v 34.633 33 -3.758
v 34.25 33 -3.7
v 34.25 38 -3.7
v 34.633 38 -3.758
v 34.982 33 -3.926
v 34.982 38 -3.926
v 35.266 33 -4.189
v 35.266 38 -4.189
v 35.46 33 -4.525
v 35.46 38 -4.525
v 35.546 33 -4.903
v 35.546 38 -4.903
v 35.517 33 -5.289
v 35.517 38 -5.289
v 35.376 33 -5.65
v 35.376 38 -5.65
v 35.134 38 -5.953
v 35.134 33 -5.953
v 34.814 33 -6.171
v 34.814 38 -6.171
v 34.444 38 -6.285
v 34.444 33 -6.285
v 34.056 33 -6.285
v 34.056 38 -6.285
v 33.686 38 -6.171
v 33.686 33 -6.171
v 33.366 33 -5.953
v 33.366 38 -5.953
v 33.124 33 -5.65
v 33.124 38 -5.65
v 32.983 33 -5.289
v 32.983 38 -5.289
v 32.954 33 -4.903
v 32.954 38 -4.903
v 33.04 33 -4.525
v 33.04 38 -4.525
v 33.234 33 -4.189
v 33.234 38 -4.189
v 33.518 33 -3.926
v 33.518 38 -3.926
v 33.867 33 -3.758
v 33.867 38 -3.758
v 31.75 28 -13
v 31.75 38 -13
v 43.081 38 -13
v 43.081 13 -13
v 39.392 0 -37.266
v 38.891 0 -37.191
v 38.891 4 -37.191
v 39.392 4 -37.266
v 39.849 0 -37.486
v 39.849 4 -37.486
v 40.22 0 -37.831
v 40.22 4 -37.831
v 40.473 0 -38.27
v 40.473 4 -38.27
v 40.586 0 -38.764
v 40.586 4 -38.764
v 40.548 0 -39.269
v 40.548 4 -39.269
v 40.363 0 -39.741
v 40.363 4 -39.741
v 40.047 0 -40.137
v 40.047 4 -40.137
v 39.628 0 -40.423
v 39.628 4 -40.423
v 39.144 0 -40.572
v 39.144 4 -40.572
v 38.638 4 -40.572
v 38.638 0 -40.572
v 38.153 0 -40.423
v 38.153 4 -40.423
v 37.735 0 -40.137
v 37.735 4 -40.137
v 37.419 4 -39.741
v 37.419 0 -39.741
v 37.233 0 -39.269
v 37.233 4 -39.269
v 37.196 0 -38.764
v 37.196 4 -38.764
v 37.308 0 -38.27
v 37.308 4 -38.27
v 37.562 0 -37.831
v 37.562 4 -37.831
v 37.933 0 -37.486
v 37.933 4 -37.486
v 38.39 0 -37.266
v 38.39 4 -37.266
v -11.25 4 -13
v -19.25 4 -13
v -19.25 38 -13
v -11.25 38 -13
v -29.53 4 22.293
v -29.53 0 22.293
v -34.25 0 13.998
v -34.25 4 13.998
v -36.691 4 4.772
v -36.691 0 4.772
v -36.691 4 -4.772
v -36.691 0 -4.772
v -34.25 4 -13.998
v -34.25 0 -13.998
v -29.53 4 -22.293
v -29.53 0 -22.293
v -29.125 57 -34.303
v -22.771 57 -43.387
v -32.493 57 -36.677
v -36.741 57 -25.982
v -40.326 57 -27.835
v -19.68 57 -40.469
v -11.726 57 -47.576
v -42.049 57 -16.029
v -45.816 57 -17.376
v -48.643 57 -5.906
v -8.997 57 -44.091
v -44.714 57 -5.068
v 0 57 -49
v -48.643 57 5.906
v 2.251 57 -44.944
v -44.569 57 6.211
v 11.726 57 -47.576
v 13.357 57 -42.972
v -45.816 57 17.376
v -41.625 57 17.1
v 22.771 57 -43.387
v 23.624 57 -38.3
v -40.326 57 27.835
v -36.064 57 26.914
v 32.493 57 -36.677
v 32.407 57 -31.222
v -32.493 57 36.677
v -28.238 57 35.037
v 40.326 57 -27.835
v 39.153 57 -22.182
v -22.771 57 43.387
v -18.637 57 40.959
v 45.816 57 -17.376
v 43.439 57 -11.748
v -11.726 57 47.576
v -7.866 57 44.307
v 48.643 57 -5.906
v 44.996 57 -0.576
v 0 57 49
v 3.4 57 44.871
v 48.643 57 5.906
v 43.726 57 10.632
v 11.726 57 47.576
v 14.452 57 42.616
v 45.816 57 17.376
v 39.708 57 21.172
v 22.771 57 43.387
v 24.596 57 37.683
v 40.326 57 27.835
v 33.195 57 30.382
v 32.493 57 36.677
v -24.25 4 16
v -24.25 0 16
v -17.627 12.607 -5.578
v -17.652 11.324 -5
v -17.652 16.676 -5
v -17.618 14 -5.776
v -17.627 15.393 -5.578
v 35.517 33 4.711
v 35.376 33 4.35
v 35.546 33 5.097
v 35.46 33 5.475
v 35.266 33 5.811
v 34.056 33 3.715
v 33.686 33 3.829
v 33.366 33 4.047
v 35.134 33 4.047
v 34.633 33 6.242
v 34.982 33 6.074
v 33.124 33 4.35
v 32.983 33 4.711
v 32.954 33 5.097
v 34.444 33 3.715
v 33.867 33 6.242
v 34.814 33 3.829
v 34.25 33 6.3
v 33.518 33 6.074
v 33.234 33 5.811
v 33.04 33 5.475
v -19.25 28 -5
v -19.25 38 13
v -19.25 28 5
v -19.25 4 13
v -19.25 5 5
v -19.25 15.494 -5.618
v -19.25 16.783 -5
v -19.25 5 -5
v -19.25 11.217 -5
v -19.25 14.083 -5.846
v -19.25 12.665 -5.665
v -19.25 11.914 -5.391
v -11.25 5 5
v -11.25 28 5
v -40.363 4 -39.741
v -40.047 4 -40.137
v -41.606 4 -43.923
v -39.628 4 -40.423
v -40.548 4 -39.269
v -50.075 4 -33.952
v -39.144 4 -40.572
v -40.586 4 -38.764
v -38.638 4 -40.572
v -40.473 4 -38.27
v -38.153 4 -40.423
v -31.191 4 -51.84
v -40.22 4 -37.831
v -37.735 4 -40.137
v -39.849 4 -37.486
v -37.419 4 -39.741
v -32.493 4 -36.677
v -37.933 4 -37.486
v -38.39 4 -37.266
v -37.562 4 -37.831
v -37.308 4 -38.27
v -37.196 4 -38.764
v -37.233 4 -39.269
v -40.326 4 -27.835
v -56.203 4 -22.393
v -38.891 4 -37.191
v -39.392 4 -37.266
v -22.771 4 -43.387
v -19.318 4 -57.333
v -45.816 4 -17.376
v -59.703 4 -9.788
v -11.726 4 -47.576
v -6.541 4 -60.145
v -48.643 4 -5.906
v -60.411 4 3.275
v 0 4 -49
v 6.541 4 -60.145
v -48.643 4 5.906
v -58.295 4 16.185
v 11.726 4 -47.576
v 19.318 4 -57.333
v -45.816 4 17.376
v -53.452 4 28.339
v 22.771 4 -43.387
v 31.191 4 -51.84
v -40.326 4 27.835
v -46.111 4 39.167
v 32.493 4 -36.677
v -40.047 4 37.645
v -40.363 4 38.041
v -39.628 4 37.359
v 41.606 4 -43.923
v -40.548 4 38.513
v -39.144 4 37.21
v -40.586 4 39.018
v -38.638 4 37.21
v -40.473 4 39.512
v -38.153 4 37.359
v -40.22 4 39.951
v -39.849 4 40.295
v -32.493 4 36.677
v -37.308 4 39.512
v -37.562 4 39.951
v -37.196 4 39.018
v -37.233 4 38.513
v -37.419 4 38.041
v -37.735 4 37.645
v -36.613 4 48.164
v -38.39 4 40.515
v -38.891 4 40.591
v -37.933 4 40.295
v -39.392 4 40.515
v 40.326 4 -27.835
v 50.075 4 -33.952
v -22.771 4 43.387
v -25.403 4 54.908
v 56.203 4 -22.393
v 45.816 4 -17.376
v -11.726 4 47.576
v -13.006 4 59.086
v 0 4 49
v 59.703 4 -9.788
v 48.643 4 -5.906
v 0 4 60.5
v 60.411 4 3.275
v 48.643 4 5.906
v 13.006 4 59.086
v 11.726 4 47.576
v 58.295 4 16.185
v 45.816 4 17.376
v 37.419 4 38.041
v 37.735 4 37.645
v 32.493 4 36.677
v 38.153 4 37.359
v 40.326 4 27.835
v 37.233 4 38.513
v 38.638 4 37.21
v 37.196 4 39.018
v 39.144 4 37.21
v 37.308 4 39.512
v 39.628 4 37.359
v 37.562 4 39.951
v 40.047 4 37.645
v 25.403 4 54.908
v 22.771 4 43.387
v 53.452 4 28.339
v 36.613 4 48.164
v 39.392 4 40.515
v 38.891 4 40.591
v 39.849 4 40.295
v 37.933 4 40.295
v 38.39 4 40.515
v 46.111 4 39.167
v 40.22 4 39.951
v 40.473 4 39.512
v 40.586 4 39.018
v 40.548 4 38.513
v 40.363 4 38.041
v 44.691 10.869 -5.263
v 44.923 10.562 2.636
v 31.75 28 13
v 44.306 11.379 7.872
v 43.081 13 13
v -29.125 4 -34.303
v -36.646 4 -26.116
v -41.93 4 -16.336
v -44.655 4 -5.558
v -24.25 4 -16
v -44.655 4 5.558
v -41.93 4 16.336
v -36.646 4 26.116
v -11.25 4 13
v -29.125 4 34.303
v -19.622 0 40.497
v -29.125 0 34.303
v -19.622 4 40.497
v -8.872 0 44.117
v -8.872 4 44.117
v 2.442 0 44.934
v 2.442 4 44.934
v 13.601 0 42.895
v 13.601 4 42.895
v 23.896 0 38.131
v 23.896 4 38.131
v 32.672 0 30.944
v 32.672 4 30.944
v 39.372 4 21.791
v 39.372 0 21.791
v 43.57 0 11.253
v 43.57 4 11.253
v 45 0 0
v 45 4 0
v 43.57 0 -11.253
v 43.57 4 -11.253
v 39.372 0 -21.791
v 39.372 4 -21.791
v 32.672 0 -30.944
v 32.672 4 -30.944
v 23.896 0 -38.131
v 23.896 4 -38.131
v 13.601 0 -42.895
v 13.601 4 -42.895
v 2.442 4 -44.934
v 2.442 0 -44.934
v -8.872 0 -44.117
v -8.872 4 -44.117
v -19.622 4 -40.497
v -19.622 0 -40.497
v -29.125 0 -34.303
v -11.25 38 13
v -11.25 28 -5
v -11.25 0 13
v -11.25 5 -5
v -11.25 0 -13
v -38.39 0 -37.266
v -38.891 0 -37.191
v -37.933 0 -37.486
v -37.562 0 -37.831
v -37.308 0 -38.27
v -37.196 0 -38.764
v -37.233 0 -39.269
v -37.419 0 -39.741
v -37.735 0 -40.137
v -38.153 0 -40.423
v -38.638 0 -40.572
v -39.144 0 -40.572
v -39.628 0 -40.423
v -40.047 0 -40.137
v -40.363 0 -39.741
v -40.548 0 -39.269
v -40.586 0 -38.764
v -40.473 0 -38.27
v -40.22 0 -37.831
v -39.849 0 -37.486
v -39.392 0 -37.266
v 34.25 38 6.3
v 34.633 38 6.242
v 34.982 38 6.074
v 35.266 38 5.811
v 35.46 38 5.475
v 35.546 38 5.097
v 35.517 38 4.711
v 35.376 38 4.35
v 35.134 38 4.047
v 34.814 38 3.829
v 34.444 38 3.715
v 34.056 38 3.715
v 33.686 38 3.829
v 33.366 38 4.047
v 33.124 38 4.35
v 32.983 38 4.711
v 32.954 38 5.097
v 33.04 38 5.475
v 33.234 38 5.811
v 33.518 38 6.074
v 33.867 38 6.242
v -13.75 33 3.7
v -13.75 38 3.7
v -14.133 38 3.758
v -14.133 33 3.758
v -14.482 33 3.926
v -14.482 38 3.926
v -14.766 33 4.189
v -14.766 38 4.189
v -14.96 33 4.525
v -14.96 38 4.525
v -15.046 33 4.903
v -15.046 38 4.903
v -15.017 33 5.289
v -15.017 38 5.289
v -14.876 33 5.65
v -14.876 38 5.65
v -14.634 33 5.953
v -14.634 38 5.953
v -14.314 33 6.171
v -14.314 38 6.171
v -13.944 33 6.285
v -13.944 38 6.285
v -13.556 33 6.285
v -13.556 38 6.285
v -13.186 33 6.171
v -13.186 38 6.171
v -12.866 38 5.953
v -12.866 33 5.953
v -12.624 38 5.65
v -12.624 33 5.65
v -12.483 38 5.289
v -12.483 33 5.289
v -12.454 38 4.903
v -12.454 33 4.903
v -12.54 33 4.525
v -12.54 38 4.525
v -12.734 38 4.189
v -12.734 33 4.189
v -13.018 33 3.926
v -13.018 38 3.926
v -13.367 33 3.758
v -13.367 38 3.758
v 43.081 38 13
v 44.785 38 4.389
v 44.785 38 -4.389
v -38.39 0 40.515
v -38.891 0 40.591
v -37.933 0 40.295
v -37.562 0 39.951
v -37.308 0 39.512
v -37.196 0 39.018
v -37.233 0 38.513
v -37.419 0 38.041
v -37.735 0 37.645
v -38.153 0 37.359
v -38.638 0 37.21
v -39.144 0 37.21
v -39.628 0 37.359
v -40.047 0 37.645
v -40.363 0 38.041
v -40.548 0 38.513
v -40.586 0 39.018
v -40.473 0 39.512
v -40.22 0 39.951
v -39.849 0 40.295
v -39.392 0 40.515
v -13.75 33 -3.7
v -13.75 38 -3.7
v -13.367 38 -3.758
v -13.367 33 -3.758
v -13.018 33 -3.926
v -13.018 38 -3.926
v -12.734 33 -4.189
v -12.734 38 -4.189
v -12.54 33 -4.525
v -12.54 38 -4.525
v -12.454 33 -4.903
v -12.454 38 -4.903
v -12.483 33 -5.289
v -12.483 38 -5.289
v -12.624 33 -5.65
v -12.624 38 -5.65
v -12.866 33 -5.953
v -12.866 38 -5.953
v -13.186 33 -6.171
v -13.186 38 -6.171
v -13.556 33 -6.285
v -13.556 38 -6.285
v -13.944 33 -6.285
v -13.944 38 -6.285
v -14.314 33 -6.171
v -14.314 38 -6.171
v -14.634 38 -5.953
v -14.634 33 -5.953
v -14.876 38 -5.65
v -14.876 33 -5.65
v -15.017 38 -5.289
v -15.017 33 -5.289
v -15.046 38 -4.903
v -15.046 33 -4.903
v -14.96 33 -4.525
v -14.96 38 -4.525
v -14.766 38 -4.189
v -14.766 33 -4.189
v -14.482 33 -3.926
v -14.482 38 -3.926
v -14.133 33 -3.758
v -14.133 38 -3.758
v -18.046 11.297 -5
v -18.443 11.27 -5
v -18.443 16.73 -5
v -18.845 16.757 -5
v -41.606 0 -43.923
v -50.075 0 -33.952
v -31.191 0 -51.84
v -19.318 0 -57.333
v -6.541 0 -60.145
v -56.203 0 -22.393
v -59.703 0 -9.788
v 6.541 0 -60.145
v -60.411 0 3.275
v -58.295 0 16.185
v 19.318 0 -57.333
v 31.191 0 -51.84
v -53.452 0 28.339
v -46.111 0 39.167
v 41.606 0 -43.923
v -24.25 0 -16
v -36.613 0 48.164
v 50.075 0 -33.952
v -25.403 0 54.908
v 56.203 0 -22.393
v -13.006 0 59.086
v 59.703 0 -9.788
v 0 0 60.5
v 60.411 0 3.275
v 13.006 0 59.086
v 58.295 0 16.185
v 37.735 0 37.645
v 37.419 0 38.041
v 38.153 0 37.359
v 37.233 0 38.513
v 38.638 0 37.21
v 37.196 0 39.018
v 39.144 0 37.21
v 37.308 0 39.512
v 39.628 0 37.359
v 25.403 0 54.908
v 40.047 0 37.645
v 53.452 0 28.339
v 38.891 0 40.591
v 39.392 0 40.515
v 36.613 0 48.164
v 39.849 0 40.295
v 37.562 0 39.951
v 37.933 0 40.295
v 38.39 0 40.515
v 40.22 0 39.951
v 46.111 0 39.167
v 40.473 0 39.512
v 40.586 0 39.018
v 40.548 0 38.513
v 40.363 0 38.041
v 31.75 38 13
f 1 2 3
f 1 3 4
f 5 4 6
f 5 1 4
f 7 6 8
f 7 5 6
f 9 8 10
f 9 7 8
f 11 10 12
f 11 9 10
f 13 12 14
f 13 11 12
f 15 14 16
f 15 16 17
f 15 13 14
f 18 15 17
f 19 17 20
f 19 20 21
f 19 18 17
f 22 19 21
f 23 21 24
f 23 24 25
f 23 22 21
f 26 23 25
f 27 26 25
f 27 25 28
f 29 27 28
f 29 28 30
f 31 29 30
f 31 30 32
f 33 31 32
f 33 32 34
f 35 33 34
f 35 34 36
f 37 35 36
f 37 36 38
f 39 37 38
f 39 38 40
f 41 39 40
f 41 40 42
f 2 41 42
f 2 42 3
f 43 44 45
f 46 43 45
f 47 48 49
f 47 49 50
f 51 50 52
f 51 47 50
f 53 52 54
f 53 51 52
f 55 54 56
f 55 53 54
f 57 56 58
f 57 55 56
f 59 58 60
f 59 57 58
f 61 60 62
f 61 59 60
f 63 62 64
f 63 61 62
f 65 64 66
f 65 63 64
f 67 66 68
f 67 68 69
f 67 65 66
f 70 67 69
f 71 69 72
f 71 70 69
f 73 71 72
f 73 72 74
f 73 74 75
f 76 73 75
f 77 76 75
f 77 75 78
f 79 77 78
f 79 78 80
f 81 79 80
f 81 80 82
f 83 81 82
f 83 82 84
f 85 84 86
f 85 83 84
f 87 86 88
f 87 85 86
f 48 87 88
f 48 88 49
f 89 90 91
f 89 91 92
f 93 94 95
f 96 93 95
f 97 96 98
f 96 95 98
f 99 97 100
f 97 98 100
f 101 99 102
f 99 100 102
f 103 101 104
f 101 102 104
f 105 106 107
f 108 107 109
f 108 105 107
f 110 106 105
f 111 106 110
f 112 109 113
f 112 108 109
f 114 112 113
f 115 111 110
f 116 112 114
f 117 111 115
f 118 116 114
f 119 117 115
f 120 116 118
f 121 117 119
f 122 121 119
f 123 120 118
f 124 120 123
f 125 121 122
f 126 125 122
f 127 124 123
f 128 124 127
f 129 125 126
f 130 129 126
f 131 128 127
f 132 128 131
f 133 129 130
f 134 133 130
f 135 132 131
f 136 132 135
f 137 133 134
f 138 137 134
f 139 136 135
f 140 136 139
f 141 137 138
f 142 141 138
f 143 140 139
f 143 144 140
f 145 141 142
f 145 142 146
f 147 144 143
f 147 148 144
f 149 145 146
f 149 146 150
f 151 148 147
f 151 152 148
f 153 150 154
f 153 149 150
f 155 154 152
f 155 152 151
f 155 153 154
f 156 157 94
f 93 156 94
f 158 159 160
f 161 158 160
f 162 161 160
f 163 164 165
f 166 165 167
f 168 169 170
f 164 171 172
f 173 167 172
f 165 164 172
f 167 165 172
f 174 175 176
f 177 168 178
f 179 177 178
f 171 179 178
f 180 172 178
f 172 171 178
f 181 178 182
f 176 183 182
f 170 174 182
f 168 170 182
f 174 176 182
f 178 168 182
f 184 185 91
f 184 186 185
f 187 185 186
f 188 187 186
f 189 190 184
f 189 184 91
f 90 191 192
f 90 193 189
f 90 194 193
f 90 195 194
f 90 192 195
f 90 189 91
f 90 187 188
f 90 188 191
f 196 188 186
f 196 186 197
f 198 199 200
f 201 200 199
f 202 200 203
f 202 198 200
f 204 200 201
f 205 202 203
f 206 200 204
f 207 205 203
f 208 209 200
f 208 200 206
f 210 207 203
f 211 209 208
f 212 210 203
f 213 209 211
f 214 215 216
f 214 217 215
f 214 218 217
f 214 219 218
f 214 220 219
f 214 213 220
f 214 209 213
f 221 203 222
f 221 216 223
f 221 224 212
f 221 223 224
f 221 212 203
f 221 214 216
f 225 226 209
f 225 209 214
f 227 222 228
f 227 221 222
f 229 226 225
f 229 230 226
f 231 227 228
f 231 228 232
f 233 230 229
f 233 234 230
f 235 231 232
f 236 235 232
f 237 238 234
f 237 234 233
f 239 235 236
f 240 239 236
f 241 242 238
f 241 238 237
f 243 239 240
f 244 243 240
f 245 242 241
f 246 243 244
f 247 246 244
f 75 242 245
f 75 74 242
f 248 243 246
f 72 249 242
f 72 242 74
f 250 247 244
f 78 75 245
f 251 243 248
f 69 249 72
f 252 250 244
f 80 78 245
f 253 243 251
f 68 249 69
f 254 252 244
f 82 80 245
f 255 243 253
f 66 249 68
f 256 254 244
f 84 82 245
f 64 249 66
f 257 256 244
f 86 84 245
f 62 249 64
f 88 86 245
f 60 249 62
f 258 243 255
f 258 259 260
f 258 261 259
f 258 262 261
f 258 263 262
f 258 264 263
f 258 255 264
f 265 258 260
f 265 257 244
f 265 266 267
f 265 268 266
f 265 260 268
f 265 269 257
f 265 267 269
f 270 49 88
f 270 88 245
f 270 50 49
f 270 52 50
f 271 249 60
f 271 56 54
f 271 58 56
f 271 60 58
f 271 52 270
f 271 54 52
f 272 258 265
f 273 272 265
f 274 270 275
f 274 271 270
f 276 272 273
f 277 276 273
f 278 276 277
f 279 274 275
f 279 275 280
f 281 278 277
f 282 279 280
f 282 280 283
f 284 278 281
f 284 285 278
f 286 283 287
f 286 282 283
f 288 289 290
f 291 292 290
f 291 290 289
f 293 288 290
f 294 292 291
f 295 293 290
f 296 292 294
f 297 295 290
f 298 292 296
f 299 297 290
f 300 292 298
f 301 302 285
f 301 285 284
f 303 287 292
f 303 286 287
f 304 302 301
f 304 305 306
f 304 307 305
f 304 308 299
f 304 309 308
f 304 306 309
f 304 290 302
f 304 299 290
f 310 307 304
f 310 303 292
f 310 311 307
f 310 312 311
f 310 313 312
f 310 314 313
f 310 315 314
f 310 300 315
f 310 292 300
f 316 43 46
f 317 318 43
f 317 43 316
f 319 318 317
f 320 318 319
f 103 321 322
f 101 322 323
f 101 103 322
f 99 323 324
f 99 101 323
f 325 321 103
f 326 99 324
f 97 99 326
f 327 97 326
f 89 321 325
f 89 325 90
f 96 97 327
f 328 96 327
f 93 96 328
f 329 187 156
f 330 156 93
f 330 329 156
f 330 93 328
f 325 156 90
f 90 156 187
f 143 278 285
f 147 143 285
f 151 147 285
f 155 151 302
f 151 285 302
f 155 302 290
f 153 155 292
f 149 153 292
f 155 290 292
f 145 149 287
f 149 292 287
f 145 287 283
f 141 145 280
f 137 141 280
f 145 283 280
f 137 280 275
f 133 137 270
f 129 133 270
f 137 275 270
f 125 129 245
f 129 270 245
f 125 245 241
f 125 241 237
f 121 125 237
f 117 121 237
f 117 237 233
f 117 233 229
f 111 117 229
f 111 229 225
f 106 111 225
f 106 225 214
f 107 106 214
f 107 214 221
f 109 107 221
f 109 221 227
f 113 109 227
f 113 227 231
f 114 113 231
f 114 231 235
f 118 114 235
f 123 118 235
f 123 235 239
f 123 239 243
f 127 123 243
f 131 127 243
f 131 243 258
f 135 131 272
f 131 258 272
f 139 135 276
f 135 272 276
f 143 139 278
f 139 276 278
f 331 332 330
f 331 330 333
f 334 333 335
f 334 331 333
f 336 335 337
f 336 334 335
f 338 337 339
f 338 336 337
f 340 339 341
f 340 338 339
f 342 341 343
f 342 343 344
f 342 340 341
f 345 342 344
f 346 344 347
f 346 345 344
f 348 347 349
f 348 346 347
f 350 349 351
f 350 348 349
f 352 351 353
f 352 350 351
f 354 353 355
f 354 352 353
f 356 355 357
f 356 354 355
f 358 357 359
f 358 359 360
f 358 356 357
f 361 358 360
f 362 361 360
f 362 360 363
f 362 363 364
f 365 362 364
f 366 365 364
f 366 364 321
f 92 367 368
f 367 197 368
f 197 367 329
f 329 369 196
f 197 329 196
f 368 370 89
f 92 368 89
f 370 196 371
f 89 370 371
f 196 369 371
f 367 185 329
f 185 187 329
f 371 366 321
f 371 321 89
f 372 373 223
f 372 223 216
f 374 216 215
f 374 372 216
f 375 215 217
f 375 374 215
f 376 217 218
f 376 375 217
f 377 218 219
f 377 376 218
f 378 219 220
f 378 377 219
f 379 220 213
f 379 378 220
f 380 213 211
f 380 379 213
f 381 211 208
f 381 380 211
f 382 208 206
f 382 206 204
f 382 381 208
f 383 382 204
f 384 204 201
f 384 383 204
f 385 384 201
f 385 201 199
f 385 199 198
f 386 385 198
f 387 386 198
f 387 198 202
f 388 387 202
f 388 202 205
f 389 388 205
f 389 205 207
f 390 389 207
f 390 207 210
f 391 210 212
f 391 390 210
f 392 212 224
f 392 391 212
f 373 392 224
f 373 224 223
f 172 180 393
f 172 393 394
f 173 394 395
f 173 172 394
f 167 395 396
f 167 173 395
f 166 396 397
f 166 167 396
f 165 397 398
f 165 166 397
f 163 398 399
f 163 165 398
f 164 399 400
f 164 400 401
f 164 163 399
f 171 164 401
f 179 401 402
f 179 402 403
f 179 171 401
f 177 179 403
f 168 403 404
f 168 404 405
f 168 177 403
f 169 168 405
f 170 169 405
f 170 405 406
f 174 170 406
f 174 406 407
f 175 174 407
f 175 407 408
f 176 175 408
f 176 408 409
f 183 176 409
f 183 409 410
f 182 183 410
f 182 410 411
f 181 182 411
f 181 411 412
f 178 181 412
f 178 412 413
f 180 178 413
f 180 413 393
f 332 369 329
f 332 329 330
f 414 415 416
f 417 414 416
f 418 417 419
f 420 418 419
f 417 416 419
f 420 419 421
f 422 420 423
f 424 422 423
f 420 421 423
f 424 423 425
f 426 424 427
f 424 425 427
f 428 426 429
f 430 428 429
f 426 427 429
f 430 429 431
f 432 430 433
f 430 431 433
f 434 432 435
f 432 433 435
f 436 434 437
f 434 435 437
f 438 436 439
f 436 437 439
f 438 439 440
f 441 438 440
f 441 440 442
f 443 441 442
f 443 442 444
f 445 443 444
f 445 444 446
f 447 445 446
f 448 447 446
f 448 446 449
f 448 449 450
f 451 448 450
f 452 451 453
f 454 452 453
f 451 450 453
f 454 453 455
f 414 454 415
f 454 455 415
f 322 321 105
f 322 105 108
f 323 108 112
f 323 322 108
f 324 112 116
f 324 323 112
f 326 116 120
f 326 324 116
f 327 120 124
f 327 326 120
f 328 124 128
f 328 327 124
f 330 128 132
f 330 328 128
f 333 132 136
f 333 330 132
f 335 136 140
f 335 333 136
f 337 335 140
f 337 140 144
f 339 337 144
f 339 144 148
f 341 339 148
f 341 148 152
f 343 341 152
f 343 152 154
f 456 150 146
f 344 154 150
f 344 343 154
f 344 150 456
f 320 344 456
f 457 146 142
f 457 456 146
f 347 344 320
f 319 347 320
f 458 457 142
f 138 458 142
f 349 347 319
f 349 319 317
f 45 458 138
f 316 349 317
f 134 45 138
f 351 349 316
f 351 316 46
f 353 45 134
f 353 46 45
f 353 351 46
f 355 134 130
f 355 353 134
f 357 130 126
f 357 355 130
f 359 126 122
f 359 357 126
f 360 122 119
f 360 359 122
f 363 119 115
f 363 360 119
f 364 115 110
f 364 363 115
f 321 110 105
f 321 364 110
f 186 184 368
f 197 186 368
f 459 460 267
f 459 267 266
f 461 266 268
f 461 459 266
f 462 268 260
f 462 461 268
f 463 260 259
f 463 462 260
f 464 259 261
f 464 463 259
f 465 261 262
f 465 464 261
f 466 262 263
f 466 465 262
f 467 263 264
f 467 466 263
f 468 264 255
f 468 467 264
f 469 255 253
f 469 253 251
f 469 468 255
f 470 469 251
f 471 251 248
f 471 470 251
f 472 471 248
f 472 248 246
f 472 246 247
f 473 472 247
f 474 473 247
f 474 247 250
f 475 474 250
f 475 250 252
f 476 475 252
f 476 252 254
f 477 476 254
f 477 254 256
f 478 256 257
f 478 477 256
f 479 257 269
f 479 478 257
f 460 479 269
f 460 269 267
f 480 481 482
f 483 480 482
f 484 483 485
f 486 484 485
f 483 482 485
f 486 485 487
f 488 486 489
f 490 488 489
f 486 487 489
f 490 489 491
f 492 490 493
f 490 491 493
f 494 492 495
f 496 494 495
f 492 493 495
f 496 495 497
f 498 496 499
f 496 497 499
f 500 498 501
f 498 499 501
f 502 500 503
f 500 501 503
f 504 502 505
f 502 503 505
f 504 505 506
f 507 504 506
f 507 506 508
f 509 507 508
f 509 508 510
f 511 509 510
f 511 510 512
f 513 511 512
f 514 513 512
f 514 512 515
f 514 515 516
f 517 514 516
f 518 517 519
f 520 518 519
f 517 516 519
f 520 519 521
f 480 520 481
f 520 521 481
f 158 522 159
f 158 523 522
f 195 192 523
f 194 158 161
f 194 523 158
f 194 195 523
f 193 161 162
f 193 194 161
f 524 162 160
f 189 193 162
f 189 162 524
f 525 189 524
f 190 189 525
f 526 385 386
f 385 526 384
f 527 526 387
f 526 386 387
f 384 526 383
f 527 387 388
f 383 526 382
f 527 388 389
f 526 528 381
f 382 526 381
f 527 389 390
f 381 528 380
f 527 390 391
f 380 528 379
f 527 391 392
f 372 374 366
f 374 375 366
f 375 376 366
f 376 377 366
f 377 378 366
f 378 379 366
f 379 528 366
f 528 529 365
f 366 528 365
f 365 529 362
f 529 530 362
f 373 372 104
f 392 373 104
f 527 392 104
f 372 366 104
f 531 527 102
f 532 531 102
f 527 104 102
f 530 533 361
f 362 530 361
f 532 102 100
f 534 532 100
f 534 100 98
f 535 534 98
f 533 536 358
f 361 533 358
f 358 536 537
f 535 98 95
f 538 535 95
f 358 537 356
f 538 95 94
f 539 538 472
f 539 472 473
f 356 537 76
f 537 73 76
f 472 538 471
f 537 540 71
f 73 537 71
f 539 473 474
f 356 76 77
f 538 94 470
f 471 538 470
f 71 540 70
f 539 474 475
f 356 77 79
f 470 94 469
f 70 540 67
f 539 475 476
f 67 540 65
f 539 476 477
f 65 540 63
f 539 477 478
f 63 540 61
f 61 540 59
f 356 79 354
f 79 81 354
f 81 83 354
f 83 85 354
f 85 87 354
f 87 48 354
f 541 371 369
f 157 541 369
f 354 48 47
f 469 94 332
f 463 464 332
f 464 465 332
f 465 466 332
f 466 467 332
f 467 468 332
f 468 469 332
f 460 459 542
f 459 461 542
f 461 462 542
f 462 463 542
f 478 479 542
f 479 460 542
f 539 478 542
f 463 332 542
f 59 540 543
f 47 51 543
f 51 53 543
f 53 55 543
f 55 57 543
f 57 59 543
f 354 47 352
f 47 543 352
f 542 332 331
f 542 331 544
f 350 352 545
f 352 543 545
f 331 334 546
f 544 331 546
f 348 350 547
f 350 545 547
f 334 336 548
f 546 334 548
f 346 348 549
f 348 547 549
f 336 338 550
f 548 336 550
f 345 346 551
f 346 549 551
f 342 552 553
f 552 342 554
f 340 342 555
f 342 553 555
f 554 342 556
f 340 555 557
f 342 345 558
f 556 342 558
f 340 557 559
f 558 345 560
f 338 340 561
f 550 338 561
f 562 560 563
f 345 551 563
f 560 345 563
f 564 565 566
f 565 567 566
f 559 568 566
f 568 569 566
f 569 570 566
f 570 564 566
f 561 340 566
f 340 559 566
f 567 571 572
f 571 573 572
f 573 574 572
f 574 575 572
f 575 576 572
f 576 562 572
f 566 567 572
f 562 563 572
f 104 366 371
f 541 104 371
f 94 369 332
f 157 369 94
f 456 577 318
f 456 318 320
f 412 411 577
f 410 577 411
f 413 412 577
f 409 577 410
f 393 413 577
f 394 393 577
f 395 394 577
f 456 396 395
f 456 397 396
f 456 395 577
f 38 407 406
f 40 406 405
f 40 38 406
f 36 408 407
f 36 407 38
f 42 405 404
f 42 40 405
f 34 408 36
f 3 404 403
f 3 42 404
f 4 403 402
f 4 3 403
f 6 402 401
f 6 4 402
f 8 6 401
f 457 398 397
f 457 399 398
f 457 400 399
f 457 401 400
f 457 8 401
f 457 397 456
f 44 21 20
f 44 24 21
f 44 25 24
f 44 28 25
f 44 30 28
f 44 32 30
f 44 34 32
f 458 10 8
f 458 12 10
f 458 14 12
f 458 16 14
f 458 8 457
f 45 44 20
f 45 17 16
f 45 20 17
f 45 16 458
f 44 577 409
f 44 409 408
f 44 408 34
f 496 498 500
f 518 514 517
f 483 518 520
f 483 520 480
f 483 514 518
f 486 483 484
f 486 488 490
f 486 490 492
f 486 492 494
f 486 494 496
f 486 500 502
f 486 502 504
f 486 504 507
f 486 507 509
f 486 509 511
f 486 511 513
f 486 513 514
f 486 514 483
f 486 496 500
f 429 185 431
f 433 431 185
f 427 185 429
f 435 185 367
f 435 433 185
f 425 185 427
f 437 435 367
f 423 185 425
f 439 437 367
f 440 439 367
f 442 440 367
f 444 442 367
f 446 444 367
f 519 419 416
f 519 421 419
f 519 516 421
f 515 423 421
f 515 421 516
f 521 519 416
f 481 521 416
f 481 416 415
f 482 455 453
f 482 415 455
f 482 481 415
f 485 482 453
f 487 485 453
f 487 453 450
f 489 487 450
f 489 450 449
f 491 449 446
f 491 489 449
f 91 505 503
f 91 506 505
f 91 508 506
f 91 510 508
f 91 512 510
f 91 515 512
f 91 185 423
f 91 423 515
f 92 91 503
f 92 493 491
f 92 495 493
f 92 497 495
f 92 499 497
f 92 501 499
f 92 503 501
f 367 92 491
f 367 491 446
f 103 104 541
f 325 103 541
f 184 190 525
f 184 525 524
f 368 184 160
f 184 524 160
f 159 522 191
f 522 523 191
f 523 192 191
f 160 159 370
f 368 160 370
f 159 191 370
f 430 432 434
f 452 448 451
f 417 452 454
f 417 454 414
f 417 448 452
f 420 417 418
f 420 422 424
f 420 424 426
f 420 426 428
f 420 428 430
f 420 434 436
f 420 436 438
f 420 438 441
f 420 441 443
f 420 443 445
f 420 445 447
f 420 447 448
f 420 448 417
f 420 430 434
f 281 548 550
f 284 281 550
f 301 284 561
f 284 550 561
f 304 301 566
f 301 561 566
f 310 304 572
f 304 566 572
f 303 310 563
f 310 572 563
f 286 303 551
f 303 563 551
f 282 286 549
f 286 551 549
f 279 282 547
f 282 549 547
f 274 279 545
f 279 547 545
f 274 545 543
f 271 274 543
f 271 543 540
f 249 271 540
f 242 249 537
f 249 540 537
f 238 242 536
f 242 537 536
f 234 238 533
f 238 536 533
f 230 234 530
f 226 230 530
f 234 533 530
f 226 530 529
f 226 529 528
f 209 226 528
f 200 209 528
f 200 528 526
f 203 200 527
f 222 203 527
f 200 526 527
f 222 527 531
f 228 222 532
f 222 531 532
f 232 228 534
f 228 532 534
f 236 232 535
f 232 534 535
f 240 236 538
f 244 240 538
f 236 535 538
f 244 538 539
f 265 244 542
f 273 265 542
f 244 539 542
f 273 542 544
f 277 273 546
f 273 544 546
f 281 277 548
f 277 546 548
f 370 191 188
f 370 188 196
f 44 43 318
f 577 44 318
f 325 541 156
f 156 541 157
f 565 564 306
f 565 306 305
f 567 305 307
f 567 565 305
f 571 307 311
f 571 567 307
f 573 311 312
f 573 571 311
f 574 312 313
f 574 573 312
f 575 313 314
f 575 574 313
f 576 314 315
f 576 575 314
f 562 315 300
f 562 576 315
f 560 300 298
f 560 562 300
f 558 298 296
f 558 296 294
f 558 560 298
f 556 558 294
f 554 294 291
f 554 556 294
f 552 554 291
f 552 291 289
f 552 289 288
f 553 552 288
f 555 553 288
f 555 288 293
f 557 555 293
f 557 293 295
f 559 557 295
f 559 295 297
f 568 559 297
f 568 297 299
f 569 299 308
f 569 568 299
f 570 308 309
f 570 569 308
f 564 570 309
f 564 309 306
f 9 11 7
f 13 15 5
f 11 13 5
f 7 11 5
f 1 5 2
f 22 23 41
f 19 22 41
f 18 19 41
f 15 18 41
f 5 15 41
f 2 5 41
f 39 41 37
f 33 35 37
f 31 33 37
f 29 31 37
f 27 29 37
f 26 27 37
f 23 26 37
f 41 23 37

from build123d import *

# Parameters (mm, degrees)
SKETCH1_R           = 60.5
SKETCH1_R_2         = 1.7
BOSS_EXTRUDE1_DEPTH = 4
SKETCH2_R           = 49
SKETCH2_R_2         = 45
BOSS_EXTRUDE2_DEPTH = 53
SKETCH3_W           = 8
SKETCH3_H           = 26
BOSS_EXTRUDE3_DEPTH = 1
SKETCH4_W           = 8
SKETCH4_H           = 8
BOSS_EXTRUDE4_DEPTH = 23
SKETCH5_W           = 8
SKETCH5_H           = 26
BOSS_EXTRUDE5_DEPTH = 10
SKETCH6_R           = 1.3
CUT_EXTRUDE1_DEPTH  = 5
BOSS_EXTRUDE6_START = -10
SKETCH7_R           = 1.3
BOSS_EXTRUDE6_DEPTH = 10
SKETCH12_R          = 1.3
BOSS_EXTRUDE8_DEPTH = 5
RIB4_REACH          = 104.808
SKETCH17_WALL_W     = 226.415050864
SKETCH17_WALL_H     = 26
SKETCH18_R          = 5
CUT_EXTRUDE3_DEPTH  = 21


with BuildPart() as part:
    # Sketch1 → Boss-Extrude1 (new body)
    with BuildSketch(Plane(origin=(0, 0, 0), x_dir=(-1, 0, 0), z_dir=(0, 1, 0))):
        Circle(SKETCH1_R)
        with Locations((38.890872965, 38.890872965)):
            Circle(SKETCH1_R_2, mode=Mode.SUBTRACT)
        with Locations((38.890872965, -38.890872965)):
            Circle(SKETCH1_R_2, mode=Mode.SUBTRACT)
        with Locations((-38.890872965, -38.890872965)):
            Circle(SKETCH1_R_2, mode=Mode.SUBTRACT)
        with Locations((-38.890872965, 38.890872965)):
            Circle(SKETCH1_R_2, mode=Mode.SUBTRACT)
        with BuildLine():
            Line((11.25, -13), (11.25, 13))
            Line((11.25, 13), (29.125473669, 34.303159964))
            ThreePointArc((29.125473669, 34.303159964), (-45, 0), (29.125473669, -34.303159964))
            Line((29.125473669, -34.303159964), (11.25, -13))
        make_face(mode=Mode.SUBTRACT)
        with BuildLine():
            Line((24.25, -16), (24.25, 16))
            Line((24.25, 16), (29.530226152, 22.292728487))
            ThreePointArc((29.530226152, 22.292728487), (37, 0), (29.530226152, -22.292728487))
            Line((29.530226152, -22.292728487), (24.25, -16))
        make_face(mode=Mode.SUBTRACT)
    extrude(amount=BOSS_EXTRUDE1_DEPTH)

    # Sketch2 → Boss-Extrude2 (add)
    with BuildSketch(Plane(origin=(0, 4, 0), x_dir=(1, 0, 0), z_dir=(0, 1, 0))):
        Circle(SKETCH2_R)
        Circle(SKETCH2_R_2, mode=Mode.SUBTRACT)
    extrude(amount=BOSS_EXTRUDE2_DEPTH)

    # Sketch3 → Boss-Extrude3 (add)
    with BuildSketch(Plane(origin=(0, 4, 0), x_dir=(1, 0, 0), z_dir=(0, 1, 0))):
        with Locations((-15.25, 0)):
            Rectangle(SKETCH3_W, SKETCH3_H)
    extrude(amount=BOSS_EXTRUDE3_DEPTH)

    # Sketch4 → Boss-Extrude4 (add)
    with BuildSketch(Plane(origin=(0, 5, 0), x_dir=(1, 0, 0), z_dir=(0, 1, 0))):
        with Locations((-15.25, 9)):
            Rectangle(SKETCH4_W, SKETCH4_H)
        with Locations((-15.25, -9)):
            Rectangle(SKETCH4_W, SKETCH4_H)
    extrude(amount=BOSS_EXTRUDE4_DEPTH)

    # Sketch5 → Boss-Extrude5 (add)
    with BuildSketch(Plane(origin=(0, 28, 0), x_dir=(1, 0, 0), z_dir=(0, 1, 0))):
        with Locations((-15.25, 0)):
            Rectangle(SKETCH5_W, SKETCH5_H)
    extrude(amount=BOSS_EXTRUDE5_DEPTH)

    # Sketch6 → Cut-Extrude1 (cut)
    with BuildSketch(Plane(origin=(0, 38, 0), x_dir=(1, 0, 0), z_dir=(0, 1, 0))):
        with Locations((-13.75, 5)):
            Circle(SKETCH6_R)
        with Locations((-13.75, -5)):
            Circle(SKETCH6_R)
    extrude(amount=-CUT_EXTRUDE1_DEPTH, mode=Mode.SUBTRACT)

    # Sketch7 → Boss-Extrude6 (add)
    with BuildSketch(Plane(origin=(0, 38, 0), x_dir=(1, 0, 0), z_dir=(0, 1, 0)).offset(BOSS_EXTRUDE6_START)):
        with BuildLine():
            Line((31.75, 13), (31.75, -13))
            Line((31.75, -13), (47.244047244, -13))
            ThreePointArc((47.244047244, -13), (49, 0), (47.244047244, 13))
            Line((47.244047244, 13), (31.75, 13))
        make_face()
        with Locations((34.25, 5)):
            Circle(SKETCH7_R, mode=Mode.SUBTRACT)
        with Locations((34.25, -5)):
            Circle(SKETCH7_R, mode=Mode.SUBTRACT)
    extrude(amount=BOSS_EXTRUDE6_DEPTH)

    # Sketch12 → Boss-Extrude8 (add)
    with BuildSketch(Plane(origin=(0, 28, 0), x_dir=(-1, 0, 0), z_dir=(0, -1, 0))):
        with Locations((-34.25, 5)):
            Circle(SKETCH12_R)
        with Locations((-34.25, -5)):
            Circle(SKETCH12_R)
    extrude(amount=-BOSS_EXTRUDE8_DEPTH)

    # Sketch17 wall → Rib4 (add, up to next)
    with BuildSketch(Plane(origin=(37.415659229, 20.5, 0), x_dir=(0.602764856689, -0.797918872781, 0), z_dir=(-0.797918872781, -0.602764856689, 0)), mode=Mode.PRIVATE) as rib4_sk1:
        Rectangle(SKETCH17_WALL_W, SKETCH17_WALL_H)
    rib4_tool1 = extrude(rib4_sk1.sketch, amount=-RIB4_REACH, mode=Mode.PRIVATE) - part.part
    add(rib4_tool1.solids().sort_by_distance((37.415659229, 20.5, 0))[0])

    # Sketch18 → Cut-Extrude3 (cut)
    with BuildSketch(Plane(origin=(-38.816562471, 0, -1.698375091), x_dir=(0, 1, 0), z_dir=(0.999044171294917, 0, 0.043712055564257474))):
        with Locations((14, 0)):
            Circle(SKETCH18_R)
    extrude(amount=CUT_EXTRUDE3_DEPTH, mode=Mode.SUBTRACT)


solid = part.part
